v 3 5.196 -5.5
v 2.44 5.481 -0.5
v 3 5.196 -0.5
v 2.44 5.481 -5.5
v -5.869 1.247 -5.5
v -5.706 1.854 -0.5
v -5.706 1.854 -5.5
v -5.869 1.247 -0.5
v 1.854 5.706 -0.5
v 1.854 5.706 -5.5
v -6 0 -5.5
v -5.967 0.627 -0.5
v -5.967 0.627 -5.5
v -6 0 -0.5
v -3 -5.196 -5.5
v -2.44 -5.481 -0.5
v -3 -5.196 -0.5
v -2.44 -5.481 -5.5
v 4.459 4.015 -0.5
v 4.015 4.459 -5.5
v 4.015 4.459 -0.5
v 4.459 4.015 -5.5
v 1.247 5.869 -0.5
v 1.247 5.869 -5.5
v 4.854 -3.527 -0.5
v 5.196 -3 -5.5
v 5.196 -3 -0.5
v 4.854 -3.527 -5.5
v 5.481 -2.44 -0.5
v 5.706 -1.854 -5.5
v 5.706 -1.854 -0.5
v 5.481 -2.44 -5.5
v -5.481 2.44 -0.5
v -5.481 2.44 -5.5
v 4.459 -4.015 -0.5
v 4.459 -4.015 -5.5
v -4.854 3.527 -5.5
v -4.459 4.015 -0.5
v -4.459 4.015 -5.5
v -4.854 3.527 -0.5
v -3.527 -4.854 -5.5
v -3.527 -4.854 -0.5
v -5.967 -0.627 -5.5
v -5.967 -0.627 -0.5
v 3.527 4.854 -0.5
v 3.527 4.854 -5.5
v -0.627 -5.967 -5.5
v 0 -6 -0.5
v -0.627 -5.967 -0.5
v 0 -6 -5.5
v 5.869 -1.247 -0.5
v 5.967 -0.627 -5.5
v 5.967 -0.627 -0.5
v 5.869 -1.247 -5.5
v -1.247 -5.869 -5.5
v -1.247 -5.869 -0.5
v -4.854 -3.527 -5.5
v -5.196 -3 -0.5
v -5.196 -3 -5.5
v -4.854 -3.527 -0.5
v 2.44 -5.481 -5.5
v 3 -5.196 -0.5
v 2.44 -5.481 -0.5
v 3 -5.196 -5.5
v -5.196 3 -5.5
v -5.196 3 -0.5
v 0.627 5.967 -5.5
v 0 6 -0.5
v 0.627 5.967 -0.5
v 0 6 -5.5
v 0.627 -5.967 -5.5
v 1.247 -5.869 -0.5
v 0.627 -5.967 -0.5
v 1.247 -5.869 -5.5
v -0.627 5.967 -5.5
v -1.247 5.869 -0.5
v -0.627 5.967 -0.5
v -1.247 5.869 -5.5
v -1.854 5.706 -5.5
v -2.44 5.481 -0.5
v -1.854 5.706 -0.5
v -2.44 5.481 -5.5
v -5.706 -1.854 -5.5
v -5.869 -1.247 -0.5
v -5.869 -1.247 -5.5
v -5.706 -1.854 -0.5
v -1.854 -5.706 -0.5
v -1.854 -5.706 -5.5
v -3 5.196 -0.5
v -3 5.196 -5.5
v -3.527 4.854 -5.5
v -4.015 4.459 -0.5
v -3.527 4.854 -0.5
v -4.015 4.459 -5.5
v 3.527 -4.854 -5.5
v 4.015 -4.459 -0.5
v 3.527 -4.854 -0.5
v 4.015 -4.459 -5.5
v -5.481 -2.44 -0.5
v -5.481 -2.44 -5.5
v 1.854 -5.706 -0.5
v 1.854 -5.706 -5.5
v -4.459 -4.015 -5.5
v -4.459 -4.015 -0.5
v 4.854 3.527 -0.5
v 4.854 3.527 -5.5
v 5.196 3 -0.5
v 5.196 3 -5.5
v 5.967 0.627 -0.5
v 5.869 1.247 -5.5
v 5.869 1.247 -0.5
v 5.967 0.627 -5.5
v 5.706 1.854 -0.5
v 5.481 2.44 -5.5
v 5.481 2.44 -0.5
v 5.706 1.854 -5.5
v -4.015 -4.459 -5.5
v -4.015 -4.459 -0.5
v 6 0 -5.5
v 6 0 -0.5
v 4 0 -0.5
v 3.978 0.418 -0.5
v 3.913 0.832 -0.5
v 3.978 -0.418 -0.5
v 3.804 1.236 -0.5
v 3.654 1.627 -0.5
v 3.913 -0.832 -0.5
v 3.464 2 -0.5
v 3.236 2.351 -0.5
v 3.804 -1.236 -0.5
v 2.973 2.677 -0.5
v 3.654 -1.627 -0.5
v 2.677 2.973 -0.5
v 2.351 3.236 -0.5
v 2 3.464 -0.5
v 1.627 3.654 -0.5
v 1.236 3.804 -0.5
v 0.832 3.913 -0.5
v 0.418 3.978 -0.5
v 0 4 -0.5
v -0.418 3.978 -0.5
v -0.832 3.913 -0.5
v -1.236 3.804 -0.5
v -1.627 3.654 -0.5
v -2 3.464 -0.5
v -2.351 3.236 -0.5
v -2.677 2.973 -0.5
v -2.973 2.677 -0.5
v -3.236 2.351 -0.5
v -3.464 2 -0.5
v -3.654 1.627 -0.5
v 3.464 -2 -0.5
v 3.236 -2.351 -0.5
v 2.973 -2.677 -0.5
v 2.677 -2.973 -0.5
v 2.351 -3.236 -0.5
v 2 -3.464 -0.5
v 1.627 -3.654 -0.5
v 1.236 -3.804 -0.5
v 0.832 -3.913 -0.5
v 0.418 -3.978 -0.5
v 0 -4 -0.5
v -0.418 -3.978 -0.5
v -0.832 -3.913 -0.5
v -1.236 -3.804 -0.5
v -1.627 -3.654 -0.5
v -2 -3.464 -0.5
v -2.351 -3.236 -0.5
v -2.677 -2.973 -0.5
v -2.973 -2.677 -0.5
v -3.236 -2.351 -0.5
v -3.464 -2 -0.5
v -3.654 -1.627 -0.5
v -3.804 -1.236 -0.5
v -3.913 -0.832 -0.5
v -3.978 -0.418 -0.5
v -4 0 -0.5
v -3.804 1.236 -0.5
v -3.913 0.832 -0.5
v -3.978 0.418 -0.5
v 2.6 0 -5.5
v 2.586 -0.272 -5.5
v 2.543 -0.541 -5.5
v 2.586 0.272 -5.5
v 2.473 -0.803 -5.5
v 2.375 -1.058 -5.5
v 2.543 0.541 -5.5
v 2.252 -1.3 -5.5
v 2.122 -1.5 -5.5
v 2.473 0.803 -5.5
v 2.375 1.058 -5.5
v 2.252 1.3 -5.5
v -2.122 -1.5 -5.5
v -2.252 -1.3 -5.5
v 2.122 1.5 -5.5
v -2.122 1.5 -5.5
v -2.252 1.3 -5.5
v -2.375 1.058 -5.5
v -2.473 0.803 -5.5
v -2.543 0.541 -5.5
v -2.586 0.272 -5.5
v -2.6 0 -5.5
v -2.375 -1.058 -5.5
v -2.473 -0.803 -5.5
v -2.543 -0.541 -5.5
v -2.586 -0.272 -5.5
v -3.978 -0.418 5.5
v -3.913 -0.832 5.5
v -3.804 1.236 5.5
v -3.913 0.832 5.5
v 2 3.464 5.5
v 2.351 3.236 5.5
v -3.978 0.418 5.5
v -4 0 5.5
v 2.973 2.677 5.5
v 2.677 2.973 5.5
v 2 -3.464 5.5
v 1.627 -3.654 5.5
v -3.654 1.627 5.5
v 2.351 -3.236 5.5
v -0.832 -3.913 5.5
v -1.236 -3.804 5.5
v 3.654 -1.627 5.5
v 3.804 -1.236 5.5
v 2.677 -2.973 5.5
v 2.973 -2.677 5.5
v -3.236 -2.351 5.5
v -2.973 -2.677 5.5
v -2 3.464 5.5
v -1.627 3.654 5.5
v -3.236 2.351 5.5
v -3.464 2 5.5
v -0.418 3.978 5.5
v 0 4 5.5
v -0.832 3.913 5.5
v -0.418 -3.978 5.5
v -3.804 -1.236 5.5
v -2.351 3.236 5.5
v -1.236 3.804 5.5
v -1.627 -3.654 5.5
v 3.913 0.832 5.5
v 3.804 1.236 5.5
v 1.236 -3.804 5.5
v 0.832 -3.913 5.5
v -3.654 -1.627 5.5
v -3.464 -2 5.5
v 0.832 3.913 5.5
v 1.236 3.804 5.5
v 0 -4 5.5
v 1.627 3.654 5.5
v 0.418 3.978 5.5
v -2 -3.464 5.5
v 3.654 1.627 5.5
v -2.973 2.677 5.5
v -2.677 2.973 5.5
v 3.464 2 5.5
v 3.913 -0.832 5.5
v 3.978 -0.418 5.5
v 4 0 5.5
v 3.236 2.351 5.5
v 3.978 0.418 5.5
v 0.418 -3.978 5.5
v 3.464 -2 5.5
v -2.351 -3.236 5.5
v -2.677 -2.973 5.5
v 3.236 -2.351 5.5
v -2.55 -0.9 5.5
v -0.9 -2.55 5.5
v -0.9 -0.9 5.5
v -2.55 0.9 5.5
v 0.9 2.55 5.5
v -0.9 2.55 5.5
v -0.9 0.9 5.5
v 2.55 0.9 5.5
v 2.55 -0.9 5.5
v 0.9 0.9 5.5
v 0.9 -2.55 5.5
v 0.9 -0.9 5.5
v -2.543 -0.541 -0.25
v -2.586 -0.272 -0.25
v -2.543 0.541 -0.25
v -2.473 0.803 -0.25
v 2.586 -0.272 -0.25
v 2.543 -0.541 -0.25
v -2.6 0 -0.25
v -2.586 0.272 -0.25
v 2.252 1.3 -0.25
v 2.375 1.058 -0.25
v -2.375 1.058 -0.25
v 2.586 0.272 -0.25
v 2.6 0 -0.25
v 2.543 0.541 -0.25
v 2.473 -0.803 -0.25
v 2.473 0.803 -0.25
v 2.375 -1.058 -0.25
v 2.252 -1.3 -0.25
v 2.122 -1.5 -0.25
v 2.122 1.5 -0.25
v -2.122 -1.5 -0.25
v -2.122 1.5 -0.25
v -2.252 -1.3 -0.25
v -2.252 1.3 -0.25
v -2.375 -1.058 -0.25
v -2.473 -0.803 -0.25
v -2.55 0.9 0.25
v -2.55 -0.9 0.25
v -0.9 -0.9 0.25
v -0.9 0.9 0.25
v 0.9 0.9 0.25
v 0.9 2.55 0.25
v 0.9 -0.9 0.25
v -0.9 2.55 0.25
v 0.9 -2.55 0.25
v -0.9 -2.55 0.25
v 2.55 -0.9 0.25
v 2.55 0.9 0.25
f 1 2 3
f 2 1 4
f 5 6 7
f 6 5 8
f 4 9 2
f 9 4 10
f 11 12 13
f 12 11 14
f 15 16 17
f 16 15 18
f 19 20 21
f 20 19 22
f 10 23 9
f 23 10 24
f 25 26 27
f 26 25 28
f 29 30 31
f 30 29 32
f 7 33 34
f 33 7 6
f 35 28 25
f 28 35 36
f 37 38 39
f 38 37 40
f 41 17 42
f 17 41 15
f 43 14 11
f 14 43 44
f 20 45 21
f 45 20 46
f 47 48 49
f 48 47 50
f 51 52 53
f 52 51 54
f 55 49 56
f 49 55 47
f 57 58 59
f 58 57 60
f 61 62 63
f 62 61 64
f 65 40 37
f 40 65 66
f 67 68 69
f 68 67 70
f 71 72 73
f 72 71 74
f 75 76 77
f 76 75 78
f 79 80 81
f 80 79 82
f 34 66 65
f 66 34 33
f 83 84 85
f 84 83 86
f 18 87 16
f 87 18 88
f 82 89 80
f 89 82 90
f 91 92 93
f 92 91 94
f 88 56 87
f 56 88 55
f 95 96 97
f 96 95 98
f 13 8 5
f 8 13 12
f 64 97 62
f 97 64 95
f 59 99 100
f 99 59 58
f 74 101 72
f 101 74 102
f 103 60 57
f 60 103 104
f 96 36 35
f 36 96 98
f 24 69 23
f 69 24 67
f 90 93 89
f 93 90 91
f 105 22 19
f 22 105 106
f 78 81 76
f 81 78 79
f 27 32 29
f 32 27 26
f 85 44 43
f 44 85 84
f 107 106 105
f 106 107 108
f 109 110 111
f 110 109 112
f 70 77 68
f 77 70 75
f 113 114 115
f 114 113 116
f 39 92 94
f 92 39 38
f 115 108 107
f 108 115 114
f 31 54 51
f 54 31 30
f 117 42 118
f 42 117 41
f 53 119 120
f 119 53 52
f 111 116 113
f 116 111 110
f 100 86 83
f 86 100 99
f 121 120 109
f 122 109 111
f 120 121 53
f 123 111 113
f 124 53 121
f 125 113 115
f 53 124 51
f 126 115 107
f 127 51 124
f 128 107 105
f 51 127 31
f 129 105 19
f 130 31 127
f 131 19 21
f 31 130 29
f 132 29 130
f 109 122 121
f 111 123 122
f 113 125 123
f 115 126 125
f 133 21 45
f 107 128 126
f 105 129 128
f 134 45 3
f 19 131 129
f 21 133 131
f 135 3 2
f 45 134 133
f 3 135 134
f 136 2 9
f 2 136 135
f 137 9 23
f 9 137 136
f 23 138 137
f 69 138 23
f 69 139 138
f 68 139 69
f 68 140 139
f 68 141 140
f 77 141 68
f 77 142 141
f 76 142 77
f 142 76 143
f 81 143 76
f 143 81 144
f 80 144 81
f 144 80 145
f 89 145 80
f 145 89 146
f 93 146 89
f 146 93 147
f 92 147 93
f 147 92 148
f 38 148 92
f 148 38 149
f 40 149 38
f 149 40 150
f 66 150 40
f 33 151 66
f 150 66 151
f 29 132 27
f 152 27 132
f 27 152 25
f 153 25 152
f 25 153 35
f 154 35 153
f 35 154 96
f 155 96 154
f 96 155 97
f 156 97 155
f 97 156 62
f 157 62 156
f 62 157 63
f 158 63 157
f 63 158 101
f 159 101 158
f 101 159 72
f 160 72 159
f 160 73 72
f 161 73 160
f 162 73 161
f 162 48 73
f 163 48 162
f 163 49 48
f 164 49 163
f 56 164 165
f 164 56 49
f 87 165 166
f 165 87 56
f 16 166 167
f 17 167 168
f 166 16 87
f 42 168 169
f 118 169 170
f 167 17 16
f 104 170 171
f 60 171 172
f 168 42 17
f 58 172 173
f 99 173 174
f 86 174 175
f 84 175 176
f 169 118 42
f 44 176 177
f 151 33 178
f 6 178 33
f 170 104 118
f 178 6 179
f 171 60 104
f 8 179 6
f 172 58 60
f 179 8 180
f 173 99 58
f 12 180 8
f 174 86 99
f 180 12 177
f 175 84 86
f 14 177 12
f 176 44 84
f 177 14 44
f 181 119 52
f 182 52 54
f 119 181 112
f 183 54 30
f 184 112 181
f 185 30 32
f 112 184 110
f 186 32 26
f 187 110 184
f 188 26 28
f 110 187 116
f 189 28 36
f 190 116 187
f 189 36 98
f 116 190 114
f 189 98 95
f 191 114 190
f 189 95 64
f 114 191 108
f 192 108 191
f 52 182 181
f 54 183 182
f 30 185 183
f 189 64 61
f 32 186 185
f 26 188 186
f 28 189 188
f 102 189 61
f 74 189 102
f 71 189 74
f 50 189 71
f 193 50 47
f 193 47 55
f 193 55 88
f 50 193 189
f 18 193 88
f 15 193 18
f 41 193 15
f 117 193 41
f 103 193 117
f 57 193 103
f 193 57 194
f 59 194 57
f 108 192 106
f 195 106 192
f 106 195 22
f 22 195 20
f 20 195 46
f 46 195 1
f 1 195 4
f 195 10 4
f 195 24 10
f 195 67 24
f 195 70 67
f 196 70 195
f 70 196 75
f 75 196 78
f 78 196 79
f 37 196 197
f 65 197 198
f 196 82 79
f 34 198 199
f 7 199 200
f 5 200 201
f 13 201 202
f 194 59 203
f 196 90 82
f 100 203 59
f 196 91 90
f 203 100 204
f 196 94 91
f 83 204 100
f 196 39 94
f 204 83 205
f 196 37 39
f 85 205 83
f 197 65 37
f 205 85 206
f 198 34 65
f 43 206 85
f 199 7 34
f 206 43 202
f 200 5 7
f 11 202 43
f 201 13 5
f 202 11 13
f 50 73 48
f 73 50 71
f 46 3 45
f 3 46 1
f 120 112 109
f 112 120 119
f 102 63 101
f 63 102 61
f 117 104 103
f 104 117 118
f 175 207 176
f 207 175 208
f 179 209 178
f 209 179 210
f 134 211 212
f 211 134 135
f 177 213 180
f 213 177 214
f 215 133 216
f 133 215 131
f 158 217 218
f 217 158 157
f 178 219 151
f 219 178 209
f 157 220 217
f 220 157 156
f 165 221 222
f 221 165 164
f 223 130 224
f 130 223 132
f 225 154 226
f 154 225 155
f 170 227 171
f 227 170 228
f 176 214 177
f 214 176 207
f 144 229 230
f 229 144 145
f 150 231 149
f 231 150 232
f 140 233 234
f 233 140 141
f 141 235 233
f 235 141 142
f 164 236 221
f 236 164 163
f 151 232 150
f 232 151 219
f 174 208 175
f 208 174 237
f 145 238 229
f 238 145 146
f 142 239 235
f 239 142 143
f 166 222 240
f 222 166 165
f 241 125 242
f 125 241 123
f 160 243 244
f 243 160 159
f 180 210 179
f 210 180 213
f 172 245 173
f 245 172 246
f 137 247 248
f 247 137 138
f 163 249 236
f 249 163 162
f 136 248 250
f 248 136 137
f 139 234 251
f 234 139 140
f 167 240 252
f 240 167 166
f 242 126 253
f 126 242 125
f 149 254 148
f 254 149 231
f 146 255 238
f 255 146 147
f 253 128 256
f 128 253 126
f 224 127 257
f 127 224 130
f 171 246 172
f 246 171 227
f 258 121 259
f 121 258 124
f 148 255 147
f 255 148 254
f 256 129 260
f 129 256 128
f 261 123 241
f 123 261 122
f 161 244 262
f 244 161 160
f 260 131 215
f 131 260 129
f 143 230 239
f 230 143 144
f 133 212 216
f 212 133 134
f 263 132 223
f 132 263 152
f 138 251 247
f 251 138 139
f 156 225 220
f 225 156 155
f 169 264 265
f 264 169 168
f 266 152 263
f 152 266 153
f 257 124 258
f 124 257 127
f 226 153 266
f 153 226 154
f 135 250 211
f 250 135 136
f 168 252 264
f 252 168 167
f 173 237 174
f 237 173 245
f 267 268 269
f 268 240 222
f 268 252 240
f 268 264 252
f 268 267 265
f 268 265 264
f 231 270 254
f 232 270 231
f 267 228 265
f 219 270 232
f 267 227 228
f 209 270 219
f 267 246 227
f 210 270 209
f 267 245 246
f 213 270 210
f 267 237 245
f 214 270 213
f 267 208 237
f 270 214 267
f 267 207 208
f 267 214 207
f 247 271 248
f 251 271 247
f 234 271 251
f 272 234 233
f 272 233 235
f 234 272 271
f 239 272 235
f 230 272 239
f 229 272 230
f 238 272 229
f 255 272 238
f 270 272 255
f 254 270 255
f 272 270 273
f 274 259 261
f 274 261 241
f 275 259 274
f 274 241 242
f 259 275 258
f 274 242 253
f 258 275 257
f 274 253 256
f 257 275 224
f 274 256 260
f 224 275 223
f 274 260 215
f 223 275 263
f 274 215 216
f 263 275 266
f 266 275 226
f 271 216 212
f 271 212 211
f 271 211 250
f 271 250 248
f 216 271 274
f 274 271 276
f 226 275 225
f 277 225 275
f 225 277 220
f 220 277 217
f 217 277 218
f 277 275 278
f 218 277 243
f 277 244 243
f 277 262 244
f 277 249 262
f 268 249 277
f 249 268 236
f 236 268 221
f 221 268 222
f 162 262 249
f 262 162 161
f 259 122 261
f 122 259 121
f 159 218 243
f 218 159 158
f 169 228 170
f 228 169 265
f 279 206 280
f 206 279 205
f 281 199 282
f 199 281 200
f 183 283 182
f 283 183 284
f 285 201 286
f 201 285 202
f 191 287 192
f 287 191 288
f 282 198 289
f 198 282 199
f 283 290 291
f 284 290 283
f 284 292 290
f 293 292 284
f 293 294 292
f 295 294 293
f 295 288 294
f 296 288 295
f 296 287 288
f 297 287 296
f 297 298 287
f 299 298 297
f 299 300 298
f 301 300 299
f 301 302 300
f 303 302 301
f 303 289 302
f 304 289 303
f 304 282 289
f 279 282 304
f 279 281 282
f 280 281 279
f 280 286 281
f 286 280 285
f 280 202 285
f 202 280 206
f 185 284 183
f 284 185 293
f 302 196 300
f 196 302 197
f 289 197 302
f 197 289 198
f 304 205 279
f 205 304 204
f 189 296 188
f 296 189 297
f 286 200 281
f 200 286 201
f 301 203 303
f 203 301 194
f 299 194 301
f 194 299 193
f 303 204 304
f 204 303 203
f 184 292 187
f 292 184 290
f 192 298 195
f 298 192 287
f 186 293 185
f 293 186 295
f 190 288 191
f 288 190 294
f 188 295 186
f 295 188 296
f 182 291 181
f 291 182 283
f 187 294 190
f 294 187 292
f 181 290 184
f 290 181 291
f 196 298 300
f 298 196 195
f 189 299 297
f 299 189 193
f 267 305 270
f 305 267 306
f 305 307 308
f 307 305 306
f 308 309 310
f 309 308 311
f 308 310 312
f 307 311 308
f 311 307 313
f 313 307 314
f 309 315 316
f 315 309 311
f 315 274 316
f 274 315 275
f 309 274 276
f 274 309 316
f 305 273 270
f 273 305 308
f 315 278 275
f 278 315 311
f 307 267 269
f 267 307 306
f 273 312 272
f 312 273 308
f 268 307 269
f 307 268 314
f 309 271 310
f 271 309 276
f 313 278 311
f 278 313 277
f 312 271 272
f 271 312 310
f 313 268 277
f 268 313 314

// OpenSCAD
// file: lego_robot_common.scad
/* 
 * Parametric Lego-Compatible Robotic Vehicle Enclosure
 * Completely self-contained OpenSCAD script.
 */

$fn = 60;

// --- LEGO & ENCLOSURE PARAMETERS ---
lego_pitch = 8.0;
lego_height = 9.6;
wall_t = 1.6;        // thin end walls (front/back) for electronics clearance
side_wall = 8.0;     // long side walls: a full LEGO unit so the lid seats and
                     // Technic holes/motor mounts sit in solid wall

// Outer Dimensions. Shorter + taller (reorg): the ULN2003 boards stand on the
// inner side walls and the ESP32 lies between them, so the floor needs less
// length; the extra height lets the phone clamp grip higher.
box_w_lu = 12; // 96.0 mm (Outer Width)
box_l_lu = 12; // 96.0 mm (Outer Length, shortened from 128)
box_h_lh = 6;  // 57.6 mm (Outer Height, raised from 48)

width = box_w_lu * lego_pitch;
length = box_l_lu * lego_pitch;
height = box_h_lh * lego_height;

lid_t = 3.2; // Sliding lid thickness
floor_z = 4.8; // 3.2mm Lego tube cavity + 1.6mm floor
lid_z = height - 2.4; // centre Z of the sliding-lid rail groove (just below top)

// --- ALIGNED INTERNAL POSITIONS ---
shaft_z = 33.6; // motor shaft / coupler height
motor_y = 26.0; // front; keeps the front mounting ear (motor_y+17.5) inside the cavity
motor_z = shaft_z - 8.0;

// --- PHONE CLAMP T-SLOT (shared by the base cavity + the moving jaw tongue) ---
// Keeping these numbers in one place stops the two parts drifting out of
// sync -- a past edit shrank the cavity without updating the tongue to
// match, letting the tongue reach 20mm past the cavity into solid wall.
clamp_tol    = 0.3;        // per-side print clearance for the sliding tongue fit
slot_x0      = -10;        // T-slot cavity start (chassis X)
slot_x1      = width / 2;  // T-slot cavity end == chassis half-width
slot_neck_z0 = 10;  slot_neck_z1 = 29;  // neck cavity Z range (jaw slides here)
slot_uc_z0   = 7;   slot_uc_z1   = 32;  // undercut cavity Z range (T-flange lock)
shelf_top_z  = 8;          // V-lip shelf top surface -- jaw geometry must clear this
// Shared Z height for both band pegs (keeps rubber band level). Must clear
// the moving jaw's grip finger floor (slot_neck_z0 + clamp_tol = 10.3) by
// enough for the d=4 peg shaft (radius 2) to stay embedded in it.
band_peg_z   = 14;

// --- PRINTABILITY HELPERS ---
// Self-supporting "teardrop" profile for a horizontal round hole: circular
// for the bottom ~180-270 degrees (so a mating round part still fits/seats
// normally), pointed above that so no internal roof ever needs to bridge
// across the hole -- avoids drooping/support for holes above ~5-8mm, which
// plain horizontal cylinder() holes need past that size.
// Bores along X, apex always toward +Z regardless of s (+1 or -1), matching
// the translate/rotate([0, s*90, 0]) convention already used for the plain
// cylinder() holes elsewhere in this project.
module teardrop_hole(d, h, s = 1) {
    r = d / 2;
    a = r / sqrt(2); // circle's 45-degree point -- where the roof takes over
    rotate([0, 0, s * 90]) rotate([90, 0, 0])
        linear_extrude(h)
            union() {
                circle(d = d);
                polygon([[-a, a], [a, a], [0, r * sqrt(2)]]);
            }
}

// --- RENDER TARGET ---
// main file
include <lego_robot_common.scad>

// Motor coupler: maps the 28BYJ-48 flat-D shaft to a standard LEGO Technic
// cross axle. Profile is Ø12 at the motor (captive) end stepping DOWN to Ø8 at
// the axle end, so it prints standing on the wide end (widest -> narrowest, no
// overhang) while the Ø12 ring stays captive behind the chassis wall and the
// Ø8 nose pokes out through the Ø8.5 hole.
module motor_coupler() {
    difference() {
        union() {
            // Motor/captive end (Ø12) and axle nose (Ø8), axis along X.
            translate([3.0, 0, 0])  rotate([0, 90, 0]) cylinder(d=12, h=5, center=true);
            translate([-2.5, 0, 0]) rotate([0, 90, 0]) cylinder(d=8,  h=6, center=true);
        }

        // 28BYJ-48 flat-D shaft socket (motor end, +X): Ø5.2 with two flats 3mm
        // apart. The flat cuts are nested in a LOCAL difference with the socket
        // cylinder so they only shape the socket -- never cut the coupler body.
        translate([3.0, 0, 0]) difference() {
            rotate([0, 90, 0]) cylinder(d=5.2, h=5.5, center=true);
            translate([0,  2.5, 0]) cube([8, 2, 6], center=true);
            translate([0, -2.5, 0]) cube([8, 2, 6], center=true);
        }

        // LEGO Technic cross-axle socket (axle end, -X).
        translate([-3.0, 0, 0]) rotate([0, 90, 0]) {
            cube([5.1, 1.8, 5.5], center=true);
            cube([1.8, 5.1, 5.5], center=true);
        }
    }
}

// Color applied for individual render view. Standalone export only: rotated
// so the module's own natural axis-along-X orientation (needed by
// lego_robot_showcase.scad, which places it against the chassis wall) prints
// standing on its wide end instead of lying on its side -- see the comment
// above. Lying on its side turns the shaft/axle sockets into horizontal
// holes needing support; standing, the whole part is support-free.
color("#f1c40f") rotate([0, 90, 0]) motor_coupler();
